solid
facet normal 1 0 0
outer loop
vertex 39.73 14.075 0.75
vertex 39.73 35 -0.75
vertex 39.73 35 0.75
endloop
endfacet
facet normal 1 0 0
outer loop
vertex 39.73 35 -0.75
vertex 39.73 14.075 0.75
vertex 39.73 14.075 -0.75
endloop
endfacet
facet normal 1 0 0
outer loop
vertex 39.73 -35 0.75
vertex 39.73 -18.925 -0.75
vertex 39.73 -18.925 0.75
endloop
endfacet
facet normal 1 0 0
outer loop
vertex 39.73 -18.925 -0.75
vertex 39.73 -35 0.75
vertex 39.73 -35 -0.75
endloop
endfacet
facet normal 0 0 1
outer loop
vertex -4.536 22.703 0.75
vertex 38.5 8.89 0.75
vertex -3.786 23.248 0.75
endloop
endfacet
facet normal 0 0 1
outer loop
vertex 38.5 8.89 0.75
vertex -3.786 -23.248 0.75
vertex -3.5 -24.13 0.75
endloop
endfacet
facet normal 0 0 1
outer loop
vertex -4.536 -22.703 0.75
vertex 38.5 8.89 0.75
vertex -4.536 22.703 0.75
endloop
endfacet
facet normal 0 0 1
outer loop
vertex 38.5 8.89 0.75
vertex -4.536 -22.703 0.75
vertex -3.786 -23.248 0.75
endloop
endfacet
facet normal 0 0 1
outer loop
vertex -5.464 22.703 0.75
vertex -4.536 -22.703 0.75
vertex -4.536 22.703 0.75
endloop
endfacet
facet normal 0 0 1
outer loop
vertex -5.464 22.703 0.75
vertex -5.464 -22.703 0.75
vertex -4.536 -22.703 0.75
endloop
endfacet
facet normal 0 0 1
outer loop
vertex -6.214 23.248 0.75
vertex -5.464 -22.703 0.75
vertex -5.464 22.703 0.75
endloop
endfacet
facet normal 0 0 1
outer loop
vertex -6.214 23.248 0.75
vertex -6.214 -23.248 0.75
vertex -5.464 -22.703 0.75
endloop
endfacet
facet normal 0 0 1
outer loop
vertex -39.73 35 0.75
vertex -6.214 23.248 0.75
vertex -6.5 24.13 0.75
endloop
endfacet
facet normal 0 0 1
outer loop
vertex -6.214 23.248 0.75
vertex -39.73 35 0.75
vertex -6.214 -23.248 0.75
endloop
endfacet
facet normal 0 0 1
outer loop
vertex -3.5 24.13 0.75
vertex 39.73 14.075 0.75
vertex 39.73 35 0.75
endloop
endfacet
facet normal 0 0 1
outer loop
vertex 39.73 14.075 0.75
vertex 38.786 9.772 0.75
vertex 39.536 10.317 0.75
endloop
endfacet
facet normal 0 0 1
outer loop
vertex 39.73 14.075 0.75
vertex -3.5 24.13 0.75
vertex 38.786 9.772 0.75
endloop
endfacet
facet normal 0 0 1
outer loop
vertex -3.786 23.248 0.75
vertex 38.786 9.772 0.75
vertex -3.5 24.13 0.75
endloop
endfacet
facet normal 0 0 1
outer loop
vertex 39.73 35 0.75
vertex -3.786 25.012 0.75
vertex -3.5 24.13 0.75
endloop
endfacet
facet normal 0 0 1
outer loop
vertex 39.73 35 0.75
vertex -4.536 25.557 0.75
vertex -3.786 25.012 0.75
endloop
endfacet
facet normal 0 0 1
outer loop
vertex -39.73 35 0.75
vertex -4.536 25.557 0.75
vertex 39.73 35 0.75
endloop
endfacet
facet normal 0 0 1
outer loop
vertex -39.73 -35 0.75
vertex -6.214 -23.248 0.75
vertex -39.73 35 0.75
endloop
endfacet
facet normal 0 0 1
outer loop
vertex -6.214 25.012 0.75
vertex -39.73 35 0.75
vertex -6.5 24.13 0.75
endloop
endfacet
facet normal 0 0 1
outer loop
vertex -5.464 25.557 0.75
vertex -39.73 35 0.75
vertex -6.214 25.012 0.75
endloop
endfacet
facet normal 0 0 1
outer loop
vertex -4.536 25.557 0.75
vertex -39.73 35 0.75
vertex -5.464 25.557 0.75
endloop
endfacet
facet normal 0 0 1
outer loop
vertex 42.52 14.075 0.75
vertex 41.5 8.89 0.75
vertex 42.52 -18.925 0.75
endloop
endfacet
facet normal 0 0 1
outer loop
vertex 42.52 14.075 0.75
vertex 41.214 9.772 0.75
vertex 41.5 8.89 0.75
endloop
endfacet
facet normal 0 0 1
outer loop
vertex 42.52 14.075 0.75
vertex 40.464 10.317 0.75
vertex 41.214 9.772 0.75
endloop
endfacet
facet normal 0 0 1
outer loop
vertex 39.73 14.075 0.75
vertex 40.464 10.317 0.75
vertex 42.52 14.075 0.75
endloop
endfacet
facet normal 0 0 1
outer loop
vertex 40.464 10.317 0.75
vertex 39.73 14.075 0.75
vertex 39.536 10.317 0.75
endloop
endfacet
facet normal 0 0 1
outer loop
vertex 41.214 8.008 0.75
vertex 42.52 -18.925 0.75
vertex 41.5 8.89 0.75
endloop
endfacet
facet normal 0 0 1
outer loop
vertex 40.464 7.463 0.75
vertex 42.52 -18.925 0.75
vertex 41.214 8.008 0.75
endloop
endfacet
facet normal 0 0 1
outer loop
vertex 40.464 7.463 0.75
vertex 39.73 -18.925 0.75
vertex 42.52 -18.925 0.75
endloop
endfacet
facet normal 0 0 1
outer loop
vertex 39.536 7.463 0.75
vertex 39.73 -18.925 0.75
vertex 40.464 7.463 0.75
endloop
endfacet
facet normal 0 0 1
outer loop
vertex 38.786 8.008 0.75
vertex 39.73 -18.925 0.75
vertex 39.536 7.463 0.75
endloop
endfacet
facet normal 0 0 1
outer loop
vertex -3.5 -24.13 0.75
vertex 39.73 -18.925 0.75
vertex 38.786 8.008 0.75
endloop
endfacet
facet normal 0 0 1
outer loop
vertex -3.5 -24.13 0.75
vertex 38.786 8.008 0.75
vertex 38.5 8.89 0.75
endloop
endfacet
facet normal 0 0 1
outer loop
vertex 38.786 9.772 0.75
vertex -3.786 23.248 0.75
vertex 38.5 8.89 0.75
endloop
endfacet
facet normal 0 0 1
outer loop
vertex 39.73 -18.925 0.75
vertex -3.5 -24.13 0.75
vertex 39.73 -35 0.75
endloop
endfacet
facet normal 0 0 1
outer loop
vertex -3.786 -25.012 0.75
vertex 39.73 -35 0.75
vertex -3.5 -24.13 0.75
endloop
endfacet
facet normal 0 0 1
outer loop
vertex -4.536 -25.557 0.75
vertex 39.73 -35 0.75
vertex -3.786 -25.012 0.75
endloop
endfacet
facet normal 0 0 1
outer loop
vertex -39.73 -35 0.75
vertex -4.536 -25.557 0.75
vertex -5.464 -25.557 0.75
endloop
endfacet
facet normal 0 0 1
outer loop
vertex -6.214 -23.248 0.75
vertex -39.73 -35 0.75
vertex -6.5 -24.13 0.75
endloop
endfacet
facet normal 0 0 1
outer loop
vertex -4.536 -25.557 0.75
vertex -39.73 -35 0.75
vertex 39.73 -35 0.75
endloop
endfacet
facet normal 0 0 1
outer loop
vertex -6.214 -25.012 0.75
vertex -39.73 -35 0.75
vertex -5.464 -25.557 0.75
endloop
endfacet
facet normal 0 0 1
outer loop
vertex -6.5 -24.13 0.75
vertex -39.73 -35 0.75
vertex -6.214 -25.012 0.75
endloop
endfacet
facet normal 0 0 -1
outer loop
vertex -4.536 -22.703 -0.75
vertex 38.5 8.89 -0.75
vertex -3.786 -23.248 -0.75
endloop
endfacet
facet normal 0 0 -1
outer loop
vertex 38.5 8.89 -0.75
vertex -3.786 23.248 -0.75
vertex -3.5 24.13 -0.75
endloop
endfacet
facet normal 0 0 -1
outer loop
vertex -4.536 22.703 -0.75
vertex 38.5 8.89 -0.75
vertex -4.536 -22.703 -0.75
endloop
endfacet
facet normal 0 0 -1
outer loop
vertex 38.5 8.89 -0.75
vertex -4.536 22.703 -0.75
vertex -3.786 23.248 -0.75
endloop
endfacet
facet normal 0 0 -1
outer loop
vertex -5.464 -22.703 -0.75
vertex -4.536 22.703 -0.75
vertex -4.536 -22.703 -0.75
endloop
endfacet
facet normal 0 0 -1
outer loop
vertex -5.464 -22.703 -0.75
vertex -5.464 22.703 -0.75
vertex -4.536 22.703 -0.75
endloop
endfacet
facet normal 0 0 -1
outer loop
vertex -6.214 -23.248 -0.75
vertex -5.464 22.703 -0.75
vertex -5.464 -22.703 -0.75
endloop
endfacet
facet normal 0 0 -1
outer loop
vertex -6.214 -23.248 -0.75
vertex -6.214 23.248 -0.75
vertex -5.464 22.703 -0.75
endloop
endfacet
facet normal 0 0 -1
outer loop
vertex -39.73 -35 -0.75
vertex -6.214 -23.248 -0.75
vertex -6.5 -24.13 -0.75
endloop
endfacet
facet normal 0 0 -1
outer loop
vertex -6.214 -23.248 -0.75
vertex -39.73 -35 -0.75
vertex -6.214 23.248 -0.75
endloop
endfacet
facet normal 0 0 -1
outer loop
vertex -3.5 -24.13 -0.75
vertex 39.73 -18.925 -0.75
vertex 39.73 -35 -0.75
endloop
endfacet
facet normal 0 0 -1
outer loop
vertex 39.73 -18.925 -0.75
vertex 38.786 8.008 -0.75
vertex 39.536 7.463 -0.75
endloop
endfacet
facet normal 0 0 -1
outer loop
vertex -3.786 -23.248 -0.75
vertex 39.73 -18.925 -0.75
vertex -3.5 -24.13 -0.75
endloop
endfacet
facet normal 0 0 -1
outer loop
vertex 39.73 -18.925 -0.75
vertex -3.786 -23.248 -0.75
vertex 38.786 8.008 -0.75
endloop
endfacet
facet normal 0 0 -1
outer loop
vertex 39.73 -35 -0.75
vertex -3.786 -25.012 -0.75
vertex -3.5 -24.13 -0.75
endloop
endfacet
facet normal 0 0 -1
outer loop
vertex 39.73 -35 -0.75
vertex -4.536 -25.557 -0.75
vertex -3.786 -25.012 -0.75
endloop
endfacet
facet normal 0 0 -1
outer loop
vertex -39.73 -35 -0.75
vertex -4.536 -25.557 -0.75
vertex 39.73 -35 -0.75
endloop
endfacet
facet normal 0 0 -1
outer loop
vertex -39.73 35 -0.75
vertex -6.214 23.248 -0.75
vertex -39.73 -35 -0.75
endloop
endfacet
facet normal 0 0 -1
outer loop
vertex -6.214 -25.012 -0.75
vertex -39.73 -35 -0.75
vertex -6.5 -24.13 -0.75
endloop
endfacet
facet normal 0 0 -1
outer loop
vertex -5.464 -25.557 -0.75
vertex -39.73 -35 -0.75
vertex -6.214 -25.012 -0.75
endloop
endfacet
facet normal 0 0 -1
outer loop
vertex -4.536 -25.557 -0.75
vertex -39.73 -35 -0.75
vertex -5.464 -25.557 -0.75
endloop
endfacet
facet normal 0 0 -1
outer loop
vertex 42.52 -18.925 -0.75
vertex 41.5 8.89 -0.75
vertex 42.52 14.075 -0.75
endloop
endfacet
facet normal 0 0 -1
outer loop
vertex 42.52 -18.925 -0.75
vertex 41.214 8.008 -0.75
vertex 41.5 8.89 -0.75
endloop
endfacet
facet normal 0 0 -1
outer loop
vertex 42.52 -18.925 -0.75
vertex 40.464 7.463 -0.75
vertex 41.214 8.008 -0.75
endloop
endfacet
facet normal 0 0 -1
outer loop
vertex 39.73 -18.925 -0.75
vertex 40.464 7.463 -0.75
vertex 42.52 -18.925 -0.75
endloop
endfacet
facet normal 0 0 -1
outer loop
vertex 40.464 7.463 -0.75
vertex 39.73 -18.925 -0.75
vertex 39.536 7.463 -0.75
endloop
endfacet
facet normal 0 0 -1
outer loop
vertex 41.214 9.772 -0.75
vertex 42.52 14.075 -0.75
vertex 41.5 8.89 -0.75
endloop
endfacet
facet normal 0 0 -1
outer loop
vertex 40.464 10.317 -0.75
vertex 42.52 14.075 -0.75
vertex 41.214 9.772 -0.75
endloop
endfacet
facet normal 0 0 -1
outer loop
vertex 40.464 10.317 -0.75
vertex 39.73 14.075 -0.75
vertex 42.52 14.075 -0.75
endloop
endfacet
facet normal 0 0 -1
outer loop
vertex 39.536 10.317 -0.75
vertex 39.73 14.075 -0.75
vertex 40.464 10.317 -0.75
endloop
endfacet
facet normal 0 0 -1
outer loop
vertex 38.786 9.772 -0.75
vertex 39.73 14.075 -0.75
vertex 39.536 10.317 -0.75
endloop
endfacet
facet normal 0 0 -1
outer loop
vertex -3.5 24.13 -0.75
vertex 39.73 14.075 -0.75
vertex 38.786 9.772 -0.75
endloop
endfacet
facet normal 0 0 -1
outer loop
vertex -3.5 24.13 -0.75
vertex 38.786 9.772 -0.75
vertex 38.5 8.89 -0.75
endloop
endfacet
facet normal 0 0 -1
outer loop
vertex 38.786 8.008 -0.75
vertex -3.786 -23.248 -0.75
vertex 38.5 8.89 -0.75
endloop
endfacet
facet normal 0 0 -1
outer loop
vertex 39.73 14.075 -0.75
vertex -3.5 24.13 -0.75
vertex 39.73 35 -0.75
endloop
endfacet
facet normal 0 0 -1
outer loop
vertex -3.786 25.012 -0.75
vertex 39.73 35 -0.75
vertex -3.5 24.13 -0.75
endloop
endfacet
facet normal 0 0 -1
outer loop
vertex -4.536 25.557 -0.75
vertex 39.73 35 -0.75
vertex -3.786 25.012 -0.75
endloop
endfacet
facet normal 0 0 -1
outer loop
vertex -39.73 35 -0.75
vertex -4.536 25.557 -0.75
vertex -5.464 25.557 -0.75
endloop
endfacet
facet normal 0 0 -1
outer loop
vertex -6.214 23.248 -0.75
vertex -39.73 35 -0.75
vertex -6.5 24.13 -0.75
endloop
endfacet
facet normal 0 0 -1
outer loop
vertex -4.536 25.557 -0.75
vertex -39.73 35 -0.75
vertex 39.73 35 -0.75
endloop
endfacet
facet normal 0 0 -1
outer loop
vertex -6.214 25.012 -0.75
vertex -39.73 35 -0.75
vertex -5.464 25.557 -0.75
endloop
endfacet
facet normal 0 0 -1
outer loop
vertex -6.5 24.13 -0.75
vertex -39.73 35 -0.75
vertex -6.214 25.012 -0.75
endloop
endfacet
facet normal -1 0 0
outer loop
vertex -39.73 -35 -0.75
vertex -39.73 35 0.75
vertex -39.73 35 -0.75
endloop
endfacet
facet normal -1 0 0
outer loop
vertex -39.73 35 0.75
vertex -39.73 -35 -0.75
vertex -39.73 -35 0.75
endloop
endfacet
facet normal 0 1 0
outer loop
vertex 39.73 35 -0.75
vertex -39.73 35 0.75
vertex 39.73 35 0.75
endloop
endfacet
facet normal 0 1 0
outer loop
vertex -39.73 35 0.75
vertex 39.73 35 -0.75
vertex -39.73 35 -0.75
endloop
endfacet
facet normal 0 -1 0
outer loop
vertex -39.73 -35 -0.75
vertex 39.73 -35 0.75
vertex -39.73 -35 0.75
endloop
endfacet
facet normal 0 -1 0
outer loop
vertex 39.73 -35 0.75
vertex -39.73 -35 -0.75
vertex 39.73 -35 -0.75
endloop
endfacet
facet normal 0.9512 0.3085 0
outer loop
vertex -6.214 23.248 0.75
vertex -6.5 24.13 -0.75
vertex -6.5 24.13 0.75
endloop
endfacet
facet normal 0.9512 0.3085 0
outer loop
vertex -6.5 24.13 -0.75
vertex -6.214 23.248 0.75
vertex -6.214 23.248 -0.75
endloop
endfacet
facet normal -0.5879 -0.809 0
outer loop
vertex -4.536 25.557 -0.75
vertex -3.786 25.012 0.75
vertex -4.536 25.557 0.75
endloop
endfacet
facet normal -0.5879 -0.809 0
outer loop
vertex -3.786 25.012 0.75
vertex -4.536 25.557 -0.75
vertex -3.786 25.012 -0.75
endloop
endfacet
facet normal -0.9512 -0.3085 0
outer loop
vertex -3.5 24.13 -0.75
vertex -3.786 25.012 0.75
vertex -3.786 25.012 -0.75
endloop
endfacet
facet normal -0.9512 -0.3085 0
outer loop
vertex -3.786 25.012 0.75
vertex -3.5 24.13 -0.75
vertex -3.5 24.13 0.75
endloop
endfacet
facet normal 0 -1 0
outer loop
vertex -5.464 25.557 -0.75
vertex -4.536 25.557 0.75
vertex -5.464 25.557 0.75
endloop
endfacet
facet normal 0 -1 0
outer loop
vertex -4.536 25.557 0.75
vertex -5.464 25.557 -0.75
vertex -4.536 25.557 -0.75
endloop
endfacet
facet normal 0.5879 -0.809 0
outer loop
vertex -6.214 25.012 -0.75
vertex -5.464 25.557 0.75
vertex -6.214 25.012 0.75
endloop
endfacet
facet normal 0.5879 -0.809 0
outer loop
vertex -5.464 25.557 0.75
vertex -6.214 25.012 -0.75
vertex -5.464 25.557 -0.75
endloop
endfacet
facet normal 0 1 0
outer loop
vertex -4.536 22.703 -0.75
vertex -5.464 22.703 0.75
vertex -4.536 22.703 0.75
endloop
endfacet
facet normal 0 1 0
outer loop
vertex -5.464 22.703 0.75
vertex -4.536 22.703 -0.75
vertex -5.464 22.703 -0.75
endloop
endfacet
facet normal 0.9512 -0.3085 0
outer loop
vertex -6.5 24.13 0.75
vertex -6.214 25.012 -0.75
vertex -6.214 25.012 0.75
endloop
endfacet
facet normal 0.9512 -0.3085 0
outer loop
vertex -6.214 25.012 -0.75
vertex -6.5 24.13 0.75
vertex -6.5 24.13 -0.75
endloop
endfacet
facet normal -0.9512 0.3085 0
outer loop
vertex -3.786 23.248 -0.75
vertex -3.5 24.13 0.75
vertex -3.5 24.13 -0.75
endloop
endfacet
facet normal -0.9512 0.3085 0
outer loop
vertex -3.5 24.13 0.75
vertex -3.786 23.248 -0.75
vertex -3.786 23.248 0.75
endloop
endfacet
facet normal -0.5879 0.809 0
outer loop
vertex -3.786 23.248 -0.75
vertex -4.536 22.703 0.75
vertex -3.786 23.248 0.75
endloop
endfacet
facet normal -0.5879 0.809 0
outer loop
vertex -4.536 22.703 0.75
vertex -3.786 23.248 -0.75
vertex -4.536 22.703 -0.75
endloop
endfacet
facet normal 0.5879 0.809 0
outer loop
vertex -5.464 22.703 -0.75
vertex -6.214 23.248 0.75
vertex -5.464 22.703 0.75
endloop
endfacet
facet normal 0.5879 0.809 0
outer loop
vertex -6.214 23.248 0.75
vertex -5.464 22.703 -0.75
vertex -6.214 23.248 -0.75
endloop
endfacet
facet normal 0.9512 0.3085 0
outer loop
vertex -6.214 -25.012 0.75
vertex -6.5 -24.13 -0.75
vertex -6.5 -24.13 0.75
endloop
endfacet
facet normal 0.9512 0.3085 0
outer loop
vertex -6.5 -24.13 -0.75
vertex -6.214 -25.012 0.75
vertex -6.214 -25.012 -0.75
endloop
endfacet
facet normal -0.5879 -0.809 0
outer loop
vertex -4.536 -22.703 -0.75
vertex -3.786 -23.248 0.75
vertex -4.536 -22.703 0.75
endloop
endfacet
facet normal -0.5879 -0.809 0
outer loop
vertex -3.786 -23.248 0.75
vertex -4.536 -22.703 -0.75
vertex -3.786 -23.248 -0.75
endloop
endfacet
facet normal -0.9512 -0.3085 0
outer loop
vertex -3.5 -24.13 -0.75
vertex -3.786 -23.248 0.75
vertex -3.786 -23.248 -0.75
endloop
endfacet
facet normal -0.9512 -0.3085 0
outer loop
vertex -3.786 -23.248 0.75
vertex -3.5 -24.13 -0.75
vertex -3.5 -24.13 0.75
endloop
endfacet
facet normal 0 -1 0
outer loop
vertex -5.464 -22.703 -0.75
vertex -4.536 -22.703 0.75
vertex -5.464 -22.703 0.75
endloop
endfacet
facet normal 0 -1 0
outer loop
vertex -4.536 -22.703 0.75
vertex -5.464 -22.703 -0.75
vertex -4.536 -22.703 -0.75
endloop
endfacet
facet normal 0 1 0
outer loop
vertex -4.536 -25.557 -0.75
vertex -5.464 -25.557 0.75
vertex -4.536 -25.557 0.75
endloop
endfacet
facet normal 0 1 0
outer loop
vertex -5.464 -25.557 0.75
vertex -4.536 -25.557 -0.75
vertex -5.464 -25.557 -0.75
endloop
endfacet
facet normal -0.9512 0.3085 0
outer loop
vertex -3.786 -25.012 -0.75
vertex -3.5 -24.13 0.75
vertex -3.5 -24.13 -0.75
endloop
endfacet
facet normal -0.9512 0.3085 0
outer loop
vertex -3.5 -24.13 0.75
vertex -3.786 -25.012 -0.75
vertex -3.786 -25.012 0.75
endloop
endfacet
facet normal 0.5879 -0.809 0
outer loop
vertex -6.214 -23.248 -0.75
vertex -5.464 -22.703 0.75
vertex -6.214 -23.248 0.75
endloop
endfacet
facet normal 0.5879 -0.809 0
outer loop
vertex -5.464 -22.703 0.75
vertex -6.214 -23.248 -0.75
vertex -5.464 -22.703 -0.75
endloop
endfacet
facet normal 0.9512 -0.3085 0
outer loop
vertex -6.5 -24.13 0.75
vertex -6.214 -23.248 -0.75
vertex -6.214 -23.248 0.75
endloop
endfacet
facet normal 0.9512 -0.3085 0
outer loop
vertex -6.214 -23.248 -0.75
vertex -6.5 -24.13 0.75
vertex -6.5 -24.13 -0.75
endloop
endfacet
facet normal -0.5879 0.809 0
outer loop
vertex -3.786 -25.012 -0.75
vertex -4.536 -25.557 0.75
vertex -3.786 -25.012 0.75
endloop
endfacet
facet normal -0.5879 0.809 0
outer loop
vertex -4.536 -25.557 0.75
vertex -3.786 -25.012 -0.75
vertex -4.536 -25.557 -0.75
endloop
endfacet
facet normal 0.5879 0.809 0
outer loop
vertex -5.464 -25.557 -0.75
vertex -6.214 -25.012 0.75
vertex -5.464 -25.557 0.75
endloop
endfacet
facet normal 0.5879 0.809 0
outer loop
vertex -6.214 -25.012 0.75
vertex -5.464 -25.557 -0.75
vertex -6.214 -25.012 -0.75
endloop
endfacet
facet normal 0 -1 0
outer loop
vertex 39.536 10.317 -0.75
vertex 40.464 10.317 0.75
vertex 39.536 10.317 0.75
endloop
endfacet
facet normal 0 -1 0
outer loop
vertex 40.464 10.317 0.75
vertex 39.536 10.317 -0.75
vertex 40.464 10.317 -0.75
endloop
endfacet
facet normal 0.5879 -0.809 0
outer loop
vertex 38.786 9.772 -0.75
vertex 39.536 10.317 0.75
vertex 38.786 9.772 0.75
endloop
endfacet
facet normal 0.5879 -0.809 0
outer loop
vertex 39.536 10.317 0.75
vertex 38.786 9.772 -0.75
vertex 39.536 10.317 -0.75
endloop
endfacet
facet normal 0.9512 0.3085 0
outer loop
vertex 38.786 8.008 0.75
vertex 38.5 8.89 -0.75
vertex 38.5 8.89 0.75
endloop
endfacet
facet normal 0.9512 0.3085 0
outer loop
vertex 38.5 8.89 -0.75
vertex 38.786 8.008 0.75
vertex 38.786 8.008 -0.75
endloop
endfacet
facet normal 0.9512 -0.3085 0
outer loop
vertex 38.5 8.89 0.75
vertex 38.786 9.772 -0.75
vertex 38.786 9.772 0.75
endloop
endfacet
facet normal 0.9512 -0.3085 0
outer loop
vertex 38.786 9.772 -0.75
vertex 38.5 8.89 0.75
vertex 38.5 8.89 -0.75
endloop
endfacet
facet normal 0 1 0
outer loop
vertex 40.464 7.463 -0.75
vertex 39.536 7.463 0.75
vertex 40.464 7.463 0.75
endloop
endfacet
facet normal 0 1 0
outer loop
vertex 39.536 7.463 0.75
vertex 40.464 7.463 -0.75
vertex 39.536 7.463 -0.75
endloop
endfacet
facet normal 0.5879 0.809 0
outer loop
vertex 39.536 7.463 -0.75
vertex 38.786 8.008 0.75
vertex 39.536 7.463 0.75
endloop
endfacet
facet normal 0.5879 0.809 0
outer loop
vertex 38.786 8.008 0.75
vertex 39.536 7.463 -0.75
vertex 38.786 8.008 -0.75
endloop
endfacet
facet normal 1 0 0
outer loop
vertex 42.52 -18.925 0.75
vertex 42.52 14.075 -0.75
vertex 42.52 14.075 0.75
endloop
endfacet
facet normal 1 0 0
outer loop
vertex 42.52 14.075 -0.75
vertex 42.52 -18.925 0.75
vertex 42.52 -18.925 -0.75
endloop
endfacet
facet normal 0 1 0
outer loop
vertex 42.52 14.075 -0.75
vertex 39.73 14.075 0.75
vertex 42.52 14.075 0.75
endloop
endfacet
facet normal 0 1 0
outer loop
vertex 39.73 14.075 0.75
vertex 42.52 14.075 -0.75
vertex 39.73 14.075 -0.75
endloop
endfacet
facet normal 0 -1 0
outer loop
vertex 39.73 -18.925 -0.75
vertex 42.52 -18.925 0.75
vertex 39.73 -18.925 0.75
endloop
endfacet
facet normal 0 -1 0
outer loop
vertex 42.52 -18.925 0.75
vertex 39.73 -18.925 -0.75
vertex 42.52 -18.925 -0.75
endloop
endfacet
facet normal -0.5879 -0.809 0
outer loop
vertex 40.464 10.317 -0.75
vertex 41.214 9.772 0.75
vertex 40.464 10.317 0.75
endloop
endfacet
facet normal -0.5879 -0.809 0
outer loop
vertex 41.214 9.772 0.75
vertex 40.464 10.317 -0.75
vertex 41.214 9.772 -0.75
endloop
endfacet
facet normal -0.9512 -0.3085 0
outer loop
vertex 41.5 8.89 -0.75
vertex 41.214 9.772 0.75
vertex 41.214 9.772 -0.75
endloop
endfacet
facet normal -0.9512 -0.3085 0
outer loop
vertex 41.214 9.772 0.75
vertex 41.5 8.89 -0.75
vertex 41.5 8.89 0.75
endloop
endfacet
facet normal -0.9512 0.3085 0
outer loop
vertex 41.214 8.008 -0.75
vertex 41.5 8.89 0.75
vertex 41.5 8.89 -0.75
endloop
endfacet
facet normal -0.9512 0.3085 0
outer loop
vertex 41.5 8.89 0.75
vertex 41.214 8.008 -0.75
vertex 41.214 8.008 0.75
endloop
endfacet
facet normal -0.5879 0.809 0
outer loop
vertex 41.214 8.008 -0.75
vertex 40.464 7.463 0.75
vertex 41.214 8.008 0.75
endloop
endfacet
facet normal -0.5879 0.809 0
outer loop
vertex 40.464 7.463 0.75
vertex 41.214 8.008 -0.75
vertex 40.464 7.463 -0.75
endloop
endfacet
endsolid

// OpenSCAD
module st_nucleo_F401RE(){
	difference(){
		cube(size=[79.46,70,1.5],center=true);
		translate([-5,24.13,0]){
			cylinder(r=1.5,h=5,$fn=10,center=true);
		}
		translate([-5,-24.13,0]){
			cylinder(r=1.5,h=5,$fn=10,center=true);
		}
		translate([40,8.89,0]){
			cylinder(r=1.5,h=5,$fn=10,center=true);
		}
	}
	difference(){
		translate([41,-2.425,0]){
			cube(size=[3.04,33,1.5],center=true);
		}
		translate([40,8.89,0]){
			cylinder(r=1.5,h=5,$fn=10,center=true);
		}
	}
	
}

st_nucleo_F401RE();
